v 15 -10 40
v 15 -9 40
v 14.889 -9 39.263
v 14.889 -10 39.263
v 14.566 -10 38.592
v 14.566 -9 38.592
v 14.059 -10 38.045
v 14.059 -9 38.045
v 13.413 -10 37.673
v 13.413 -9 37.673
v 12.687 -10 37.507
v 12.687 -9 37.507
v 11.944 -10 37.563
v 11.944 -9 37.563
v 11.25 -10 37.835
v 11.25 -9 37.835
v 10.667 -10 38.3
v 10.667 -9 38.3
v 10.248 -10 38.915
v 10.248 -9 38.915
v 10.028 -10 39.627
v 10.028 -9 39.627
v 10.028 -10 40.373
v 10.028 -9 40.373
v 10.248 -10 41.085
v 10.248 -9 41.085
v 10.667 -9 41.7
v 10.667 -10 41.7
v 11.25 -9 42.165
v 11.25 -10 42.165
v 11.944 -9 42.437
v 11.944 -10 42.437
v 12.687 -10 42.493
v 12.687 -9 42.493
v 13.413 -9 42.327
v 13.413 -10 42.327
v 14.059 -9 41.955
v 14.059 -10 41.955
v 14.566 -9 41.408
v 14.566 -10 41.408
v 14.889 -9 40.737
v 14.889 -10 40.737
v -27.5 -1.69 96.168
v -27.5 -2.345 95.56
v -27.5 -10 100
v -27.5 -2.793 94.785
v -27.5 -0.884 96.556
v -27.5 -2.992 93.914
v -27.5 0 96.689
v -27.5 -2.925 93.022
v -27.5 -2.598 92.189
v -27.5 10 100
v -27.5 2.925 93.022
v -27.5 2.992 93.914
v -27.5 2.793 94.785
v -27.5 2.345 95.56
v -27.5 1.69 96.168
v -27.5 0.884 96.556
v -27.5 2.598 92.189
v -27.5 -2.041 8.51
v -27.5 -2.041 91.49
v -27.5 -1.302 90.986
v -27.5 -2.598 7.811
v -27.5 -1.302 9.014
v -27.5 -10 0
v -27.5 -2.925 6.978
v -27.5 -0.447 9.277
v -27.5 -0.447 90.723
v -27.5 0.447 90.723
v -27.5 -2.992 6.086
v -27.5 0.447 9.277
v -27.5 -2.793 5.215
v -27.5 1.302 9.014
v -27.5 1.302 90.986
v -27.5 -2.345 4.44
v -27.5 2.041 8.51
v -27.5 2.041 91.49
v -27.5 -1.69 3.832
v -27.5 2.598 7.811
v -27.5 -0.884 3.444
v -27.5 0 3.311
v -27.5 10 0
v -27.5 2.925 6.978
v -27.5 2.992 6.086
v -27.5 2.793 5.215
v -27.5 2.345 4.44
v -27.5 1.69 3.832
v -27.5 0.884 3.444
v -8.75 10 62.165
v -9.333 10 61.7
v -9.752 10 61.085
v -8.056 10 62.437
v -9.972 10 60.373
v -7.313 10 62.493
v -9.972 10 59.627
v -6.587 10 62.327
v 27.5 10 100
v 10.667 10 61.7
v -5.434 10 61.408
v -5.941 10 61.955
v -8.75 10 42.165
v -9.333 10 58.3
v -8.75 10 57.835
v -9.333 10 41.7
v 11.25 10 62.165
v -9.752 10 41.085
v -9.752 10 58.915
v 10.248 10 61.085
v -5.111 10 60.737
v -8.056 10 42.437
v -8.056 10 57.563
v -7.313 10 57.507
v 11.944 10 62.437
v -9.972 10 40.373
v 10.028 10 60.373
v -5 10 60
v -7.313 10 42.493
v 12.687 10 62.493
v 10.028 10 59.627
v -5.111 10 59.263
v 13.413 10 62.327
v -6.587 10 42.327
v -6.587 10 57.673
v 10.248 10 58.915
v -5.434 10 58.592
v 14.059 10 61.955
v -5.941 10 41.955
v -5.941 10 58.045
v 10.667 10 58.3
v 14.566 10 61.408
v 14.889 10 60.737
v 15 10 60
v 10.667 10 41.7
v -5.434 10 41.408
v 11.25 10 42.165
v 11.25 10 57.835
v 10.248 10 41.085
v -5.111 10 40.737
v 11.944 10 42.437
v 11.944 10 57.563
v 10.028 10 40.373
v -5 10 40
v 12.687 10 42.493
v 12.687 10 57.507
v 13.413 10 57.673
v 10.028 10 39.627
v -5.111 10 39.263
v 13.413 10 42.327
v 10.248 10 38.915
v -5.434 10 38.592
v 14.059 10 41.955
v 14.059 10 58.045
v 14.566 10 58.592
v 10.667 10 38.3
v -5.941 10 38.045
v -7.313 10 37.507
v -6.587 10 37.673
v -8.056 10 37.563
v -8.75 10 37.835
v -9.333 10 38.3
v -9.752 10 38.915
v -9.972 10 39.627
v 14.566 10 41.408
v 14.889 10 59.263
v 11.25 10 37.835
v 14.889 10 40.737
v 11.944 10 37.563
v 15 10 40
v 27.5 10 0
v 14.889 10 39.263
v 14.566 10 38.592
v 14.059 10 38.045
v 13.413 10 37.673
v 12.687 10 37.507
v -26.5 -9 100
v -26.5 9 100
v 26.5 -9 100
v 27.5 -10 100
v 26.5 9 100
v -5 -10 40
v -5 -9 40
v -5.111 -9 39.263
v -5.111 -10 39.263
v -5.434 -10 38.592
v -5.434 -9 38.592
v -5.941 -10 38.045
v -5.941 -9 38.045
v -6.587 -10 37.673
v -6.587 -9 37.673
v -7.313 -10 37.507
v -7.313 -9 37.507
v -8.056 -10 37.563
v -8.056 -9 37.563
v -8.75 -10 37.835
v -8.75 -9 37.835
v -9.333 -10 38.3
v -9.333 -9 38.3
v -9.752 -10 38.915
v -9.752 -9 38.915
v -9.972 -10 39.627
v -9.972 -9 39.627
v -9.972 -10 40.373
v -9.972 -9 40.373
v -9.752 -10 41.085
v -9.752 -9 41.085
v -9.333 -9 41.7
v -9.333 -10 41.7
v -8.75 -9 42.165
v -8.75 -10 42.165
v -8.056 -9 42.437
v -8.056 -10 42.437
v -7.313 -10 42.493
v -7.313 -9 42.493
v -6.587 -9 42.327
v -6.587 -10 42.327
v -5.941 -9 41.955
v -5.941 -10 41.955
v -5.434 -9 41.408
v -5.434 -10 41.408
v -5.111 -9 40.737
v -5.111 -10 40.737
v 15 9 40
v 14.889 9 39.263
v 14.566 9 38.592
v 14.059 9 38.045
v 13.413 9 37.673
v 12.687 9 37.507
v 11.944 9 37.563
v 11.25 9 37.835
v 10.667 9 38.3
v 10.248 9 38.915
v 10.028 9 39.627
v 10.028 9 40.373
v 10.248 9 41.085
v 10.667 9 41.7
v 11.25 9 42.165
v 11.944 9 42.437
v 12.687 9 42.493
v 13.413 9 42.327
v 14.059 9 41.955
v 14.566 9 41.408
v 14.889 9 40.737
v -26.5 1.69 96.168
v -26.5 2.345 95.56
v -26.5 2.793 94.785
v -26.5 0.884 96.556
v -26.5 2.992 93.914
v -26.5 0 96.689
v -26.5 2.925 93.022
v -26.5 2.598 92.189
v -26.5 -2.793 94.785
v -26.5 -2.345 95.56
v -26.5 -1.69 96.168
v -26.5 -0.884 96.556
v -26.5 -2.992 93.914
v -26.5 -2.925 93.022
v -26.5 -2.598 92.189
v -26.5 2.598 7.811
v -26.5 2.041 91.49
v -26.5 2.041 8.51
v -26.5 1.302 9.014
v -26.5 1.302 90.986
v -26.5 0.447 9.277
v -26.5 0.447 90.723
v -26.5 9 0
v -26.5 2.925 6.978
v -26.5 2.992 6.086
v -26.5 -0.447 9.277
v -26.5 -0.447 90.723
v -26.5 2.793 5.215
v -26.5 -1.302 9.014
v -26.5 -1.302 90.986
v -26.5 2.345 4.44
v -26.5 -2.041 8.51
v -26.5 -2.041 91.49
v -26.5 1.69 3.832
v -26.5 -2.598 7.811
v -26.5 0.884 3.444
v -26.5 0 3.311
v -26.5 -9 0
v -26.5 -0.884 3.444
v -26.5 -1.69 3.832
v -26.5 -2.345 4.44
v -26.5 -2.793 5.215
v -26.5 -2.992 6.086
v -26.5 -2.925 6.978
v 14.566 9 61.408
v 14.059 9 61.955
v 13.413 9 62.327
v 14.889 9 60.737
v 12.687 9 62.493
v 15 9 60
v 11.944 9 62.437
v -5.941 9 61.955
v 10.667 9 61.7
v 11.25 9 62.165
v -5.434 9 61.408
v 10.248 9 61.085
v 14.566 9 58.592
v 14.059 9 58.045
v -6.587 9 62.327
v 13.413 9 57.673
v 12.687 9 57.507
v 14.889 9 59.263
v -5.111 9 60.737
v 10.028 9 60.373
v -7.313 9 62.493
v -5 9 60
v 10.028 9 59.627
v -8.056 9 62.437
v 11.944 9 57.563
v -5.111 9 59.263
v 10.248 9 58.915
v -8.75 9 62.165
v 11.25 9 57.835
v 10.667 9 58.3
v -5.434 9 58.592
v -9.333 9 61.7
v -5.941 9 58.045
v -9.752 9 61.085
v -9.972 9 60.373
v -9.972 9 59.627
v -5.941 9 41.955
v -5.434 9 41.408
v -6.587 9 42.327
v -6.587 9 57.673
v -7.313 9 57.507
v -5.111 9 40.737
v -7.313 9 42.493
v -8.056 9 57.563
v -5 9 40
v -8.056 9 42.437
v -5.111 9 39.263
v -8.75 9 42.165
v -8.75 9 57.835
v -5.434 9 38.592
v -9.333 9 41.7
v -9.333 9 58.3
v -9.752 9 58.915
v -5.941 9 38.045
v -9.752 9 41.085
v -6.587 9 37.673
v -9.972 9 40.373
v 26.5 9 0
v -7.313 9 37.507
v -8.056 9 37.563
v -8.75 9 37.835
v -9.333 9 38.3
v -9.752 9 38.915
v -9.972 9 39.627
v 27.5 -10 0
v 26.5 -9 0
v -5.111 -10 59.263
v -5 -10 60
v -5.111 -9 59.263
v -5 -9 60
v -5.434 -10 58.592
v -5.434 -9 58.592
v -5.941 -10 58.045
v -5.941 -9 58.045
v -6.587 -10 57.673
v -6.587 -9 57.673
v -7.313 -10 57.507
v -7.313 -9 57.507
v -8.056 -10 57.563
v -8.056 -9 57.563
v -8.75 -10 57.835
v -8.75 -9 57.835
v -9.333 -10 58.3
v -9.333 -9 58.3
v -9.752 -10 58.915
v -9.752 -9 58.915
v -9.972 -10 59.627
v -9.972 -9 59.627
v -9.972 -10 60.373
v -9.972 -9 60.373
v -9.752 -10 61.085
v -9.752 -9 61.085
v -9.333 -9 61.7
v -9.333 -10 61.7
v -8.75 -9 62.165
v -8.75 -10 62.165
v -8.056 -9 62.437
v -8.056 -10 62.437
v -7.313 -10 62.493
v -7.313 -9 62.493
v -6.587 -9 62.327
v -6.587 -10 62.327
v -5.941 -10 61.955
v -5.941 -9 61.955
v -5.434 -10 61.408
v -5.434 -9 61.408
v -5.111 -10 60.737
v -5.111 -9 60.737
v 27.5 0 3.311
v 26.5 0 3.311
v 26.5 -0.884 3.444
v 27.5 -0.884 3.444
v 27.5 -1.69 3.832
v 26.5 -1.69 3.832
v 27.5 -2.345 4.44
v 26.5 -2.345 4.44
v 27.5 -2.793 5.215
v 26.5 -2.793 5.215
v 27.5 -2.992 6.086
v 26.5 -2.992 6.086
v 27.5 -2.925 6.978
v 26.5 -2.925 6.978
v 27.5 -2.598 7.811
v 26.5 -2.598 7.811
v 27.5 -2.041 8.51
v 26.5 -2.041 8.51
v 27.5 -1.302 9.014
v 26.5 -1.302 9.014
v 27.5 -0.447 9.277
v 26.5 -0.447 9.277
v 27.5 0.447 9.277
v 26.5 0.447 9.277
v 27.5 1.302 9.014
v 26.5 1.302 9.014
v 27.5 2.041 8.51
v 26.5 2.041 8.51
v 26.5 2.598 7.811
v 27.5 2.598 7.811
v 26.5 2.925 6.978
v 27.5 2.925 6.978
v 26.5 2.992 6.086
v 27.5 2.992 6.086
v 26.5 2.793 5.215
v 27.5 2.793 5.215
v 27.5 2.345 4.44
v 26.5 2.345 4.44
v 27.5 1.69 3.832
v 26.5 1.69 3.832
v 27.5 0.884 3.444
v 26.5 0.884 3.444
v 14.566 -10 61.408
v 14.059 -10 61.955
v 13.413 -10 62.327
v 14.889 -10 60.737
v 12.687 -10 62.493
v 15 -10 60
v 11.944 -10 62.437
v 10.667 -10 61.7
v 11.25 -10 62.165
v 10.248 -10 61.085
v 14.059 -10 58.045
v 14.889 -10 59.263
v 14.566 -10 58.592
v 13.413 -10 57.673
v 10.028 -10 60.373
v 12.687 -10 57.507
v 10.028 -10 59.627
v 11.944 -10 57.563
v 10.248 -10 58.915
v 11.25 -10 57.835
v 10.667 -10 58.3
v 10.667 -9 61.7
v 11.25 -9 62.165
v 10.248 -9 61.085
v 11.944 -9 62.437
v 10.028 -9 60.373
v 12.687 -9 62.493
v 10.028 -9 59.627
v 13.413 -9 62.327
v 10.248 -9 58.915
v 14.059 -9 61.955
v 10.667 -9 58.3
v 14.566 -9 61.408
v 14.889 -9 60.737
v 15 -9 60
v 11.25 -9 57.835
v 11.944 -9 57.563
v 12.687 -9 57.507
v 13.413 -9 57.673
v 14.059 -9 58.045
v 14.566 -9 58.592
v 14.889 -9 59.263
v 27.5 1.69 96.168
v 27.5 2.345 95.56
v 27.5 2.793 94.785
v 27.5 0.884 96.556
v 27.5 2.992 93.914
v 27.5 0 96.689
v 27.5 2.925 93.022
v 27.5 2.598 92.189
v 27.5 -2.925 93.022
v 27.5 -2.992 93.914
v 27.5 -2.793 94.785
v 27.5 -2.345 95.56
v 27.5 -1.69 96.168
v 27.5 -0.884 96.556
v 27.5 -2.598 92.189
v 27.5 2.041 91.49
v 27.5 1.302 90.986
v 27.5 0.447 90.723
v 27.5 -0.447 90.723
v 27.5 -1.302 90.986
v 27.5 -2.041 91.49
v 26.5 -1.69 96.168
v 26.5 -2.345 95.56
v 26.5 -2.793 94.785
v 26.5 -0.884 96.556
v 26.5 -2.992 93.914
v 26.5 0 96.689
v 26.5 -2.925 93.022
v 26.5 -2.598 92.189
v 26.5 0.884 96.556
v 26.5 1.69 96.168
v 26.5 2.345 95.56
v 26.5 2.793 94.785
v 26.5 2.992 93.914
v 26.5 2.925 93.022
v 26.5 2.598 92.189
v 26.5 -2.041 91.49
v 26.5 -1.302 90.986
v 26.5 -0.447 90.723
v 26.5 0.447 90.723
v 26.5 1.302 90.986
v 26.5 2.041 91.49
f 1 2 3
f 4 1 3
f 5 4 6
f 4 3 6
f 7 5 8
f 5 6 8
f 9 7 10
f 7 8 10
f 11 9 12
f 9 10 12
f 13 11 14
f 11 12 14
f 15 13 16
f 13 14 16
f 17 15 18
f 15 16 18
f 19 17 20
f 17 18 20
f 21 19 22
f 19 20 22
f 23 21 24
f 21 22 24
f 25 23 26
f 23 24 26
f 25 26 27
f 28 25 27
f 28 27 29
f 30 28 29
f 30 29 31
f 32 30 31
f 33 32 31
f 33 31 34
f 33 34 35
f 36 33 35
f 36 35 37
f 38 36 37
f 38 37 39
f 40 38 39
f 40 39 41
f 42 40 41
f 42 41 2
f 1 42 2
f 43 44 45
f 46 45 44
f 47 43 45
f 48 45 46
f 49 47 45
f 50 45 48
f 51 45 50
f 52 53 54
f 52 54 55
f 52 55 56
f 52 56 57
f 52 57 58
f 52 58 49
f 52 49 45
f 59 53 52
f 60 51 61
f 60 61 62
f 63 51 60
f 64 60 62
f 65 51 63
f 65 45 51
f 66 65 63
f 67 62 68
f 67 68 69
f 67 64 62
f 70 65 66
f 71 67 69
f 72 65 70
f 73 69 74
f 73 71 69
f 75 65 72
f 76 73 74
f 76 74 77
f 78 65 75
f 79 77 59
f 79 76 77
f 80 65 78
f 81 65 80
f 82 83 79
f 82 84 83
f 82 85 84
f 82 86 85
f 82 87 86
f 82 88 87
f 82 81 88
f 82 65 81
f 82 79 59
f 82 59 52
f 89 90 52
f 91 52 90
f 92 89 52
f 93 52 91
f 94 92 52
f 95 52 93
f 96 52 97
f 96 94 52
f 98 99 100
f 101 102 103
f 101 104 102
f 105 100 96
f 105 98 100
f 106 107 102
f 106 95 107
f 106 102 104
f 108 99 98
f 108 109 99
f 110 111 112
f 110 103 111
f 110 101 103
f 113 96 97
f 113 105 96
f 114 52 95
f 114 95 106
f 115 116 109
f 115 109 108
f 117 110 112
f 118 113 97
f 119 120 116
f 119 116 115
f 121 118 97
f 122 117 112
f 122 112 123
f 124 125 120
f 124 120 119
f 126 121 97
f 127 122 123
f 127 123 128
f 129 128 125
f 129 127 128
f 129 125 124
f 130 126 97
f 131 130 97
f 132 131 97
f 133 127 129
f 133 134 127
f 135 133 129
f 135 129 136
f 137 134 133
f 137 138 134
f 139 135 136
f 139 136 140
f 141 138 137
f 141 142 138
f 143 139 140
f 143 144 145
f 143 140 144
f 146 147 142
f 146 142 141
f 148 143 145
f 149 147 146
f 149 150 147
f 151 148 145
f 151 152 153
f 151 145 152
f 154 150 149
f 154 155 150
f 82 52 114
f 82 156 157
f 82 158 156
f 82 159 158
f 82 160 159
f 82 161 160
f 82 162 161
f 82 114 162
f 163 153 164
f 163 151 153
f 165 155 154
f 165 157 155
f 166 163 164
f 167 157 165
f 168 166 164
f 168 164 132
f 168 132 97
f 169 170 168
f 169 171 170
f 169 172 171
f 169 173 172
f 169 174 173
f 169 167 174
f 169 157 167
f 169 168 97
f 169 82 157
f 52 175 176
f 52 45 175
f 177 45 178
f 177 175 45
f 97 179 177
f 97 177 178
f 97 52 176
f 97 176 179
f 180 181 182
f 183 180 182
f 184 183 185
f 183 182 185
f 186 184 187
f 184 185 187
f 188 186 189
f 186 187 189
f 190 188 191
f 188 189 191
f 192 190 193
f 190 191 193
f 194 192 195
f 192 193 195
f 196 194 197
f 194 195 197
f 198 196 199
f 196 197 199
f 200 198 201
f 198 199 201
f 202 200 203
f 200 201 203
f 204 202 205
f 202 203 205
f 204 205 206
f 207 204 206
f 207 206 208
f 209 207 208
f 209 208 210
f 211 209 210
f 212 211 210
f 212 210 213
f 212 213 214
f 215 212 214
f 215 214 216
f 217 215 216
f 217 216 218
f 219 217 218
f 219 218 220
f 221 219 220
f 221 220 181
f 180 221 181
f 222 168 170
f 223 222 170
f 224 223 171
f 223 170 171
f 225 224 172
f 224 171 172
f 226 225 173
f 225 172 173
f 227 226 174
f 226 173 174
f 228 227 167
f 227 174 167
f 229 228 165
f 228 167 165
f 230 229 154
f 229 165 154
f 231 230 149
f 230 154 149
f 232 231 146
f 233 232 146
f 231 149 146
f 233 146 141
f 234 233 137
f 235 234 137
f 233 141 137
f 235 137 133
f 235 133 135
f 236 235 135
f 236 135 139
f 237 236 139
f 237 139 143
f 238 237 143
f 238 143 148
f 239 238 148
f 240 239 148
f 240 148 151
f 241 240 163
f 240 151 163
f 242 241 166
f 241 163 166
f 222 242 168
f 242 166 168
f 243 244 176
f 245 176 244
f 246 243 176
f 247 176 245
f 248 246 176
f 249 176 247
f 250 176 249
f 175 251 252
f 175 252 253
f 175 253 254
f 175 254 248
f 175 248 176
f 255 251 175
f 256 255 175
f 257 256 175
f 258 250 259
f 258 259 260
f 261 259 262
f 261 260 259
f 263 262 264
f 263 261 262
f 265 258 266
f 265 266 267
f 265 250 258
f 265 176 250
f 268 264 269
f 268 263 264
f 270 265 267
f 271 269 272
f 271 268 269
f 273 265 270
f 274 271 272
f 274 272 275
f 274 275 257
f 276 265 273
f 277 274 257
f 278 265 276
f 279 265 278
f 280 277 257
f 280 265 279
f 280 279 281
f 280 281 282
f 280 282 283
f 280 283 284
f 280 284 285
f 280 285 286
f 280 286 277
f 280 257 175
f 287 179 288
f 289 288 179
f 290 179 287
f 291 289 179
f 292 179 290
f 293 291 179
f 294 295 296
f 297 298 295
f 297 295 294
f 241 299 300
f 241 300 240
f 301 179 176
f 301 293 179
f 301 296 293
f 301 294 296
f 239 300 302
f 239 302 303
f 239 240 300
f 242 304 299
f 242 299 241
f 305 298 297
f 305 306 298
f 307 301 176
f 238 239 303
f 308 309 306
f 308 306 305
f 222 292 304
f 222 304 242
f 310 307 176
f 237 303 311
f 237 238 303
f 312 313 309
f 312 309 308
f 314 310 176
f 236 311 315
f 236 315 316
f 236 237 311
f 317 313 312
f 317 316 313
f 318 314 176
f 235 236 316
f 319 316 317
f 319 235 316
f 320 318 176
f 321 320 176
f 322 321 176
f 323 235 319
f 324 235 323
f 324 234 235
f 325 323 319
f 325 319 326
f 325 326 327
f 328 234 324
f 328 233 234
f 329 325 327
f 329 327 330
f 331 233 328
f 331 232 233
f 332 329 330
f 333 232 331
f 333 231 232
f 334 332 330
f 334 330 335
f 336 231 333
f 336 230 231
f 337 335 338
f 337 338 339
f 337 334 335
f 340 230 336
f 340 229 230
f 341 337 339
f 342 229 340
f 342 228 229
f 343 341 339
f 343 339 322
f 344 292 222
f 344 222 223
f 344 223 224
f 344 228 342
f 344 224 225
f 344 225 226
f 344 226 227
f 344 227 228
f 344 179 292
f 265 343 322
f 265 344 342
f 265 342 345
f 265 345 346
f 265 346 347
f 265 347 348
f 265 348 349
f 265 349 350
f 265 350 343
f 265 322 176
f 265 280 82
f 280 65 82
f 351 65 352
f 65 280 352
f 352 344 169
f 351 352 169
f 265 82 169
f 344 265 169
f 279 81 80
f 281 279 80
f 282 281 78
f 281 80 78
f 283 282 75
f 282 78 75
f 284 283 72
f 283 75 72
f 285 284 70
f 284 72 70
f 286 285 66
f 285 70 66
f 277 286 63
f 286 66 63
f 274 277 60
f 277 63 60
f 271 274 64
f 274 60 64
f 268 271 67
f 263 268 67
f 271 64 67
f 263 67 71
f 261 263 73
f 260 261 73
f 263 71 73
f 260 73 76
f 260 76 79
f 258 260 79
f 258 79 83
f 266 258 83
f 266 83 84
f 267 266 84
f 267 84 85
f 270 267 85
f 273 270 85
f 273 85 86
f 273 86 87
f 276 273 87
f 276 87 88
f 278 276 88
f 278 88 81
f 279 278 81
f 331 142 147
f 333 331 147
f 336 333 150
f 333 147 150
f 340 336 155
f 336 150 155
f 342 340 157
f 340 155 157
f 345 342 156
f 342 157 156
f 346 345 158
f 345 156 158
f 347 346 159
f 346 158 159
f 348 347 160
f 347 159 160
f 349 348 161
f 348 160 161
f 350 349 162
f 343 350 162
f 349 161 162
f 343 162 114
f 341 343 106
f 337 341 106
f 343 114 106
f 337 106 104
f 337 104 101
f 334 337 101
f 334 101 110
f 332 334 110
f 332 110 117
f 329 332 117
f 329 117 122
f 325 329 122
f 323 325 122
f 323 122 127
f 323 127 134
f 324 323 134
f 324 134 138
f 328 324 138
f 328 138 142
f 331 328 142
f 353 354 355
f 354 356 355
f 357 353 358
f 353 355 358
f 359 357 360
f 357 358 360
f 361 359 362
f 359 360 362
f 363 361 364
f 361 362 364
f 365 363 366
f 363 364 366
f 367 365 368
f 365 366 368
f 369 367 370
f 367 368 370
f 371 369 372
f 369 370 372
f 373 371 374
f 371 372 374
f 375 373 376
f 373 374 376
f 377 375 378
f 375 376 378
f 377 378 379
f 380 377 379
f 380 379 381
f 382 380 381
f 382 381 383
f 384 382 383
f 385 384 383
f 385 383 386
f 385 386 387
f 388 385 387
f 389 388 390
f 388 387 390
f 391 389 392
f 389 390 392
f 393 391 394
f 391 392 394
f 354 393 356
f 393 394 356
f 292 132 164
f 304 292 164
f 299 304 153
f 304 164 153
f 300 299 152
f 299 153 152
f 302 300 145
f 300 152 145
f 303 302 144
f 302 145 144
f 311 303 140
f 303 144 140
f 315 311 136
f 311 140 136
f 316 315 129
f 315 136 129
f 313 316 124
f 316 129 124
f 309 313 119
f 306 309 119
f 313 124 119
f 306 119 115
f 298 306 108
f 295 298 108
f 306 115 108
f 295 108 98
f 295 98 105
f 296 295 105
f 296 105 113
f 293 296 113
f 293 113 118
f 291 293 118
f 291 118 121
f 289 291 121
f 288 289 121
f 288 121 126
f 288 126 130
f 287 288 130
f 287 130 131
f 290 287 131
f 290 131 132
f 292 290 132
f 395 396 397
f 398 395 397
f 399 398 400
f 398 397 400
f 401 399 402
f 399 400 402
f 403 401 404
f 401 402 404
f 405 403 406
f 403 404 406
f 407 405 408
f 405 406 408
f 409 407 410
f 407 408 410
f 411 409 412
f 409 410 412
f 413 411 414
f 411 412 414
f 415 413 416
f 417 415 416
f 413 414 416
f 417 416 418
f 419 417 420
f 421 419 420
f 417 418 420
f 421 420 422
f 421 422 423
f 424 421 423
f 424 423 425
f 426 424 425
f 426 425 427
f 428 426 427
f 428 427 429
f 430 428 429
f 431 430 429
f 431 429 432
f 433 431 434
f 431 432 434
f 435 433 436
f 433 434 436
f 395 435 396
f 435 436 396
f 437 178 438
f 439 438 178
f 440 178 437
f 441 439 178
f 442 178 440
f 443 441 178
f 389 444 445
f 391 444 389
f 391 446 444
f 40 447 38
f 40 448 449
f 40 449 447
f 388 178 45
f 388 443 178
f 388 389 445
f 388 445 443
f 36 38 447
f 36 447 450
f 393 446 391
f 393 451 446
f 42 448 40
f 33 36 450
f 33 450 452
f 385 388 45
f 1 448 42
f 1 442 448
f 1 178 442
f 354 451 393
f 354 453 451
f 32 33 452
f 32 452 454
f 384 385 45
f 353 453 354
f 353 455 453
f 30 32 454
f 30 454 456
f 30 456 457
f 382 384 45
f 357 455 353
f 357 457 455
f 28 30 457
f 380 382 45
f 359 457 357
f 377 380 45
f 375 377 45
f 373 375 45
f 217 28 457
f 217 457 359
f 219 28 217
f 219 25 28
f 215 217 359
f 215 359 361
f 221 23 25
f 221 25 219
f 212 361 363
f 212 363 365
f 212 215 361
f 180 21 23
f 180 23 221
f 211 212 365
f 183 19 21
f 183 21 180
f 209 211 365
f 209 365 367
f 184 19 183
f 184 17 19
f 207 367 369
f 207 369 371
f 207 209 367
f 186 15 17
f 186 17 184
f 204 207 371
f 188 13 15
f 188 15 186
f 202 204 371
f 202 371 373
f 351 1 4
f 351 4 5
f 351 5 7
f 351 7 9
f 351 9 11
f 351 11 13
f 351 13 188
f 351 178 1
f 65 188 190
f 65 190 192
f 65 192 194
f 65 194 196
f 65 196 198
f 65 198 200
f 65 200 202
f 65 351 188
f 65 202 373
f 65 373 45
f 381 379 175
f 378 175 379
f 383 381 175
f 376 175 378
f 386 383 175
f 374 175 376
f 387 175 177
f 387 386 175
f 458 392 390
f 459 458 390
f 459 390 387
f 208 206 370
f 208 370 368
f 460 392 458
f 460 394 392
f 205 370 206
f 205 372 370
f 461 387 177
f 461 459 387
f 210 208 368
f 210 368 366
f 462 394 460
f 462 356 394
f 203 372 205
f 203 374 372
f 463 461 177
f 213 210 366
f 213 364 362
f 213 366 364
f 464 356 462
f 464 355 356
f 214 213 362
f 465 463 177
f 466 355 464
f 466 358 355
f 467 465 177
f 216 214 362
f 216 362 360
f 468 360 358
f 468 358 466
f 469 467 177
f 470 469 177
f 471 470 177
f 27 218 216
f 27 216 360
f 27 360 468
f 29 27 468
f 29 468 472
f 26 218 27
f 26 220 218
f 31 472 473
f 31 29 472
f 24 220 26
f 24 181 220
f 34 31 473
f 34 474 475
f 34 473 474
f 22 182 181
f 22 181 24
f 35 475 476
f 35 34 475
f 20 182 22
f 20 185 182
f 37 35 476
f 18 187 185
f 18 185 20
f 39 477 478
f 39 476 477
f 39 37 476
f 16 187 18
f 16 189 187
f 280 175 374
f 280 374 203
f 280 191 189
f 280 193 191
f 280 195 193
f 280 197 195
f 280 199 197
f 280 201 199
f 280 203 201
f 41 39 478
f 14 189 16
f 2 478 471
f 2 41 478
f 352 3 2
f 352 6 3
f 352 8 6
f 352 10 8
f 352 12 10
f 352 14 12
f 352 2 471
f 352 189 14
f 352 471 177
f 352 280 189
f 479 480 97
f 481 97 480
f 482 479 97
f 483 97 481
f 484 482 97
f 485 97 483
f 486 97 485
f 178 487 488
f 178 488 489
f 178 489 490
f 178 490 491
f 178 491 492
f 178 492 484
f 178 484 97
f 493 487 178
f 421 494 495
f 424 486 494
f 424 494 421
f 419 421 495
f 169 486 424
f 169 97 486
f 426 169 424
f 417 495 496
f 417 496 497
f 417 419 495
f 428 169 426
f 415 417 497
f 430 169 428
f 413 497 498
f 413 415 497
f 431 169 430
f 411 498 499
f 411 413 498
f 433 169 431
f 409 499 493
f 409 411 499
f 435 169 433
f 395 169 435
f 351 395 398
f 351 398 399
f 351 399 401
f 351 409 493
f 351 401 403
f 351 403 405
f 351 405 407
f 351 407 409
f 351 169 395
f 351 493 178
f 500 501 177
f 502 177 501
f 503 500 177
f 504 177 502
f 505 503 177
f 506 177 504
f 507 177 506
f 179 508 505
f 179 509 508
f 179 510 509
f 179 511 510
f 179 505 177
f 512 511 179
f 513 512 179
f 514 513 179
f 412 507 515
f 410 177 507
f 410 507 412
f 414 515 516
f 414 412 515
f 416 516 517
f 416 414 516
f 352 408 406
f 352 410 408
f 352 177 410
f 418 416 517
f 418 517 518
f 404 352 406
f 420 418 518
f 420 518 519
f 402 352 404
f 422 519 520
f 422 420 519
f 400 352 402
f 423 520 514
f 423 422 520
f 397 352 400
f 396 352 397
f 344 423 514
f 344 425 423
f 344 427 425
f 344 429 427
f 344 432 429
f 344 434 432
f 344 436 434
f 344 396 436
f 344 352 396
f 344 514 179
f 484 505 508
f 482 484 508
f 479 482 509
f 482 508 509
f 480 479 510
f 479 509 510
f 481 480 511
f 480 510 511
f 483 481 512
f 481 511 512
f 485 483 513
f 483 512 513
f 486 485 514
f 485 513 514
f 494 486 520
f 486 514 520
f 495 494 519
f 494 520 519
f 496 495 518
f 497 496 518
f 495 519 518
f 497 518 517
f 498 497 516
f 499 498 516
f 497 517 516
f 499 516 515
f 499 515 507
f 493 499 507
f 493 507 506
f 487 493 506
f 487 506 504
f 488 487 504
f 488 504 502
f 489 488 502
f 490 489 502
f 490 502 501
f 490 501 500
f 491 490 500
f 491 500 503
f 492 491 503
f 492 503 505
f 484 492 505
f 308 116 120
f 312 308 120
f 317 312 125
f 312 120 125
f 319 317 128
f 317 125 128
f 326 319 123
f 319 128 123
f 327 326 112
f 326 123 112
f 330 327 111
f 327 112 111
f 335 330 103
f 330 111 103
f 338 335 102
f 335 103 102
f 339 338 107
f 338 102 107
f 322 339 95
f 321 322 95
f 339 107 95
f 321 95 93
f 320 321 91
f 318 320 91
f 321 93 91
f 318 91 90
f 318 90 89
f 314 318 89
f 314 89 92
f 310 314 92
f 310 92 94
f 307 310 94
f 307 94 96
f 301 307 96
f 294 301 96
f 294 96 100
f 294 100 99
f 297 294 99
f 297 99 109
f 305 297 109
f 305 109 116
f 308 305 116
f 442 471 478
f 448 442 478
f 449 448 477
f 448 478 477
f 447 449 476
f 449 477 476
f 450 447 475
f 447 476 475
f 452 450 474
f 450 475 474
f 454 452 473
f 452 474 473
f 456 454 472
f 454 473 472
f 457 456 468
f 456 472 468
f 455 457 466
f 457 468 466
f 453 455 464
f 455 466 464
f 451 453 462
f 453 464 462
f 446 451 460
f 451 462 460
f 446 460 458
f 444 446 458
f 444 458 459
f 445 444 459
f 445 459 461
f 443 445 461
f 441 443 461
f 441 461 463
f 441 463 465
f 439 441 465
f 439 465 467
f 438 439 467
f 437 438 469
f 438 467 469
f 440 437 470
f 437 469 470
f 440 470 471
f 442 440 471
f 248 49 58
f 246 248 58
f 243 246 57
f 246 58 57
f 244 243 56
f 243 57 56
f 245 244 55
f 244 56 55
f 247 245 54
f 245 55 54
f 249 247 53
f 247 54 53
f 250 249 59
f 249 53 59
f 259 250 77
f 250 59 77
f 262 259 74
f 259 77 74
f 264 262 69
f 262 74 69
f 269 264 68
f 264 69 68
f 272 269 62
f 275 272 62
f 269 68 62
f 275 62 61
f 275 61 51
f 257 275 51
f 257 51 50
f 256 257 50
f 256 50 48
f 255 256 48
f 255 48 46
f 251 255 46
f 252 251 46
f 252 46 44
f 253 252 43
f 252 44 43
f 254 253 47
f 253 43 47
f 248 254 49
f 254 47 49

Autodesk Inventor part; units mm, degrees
ref_plane "YZ Plane" through (0, 0, 0) normal (1, 0, 0) x (0, 1, 0)
ref_plane "XZ Plane" through (0, 0, 0) normal (0, 1, 0) x (-1, 0, 0)
sketch "草图1" plane through (0, 0, 0) normal (0, 0, 1) x (1, 0, 0)
  line L0 (27.5, -10) -> (-27.5, -10)
  line L1 (-27.5, -10) -> (-27.5, 10)
  line L2 (-27.5, 10) -> (27.5, 10)
  line L3 (27.5, 10) -> (27.5, -10)
  line L4 (27.5, -10) -> (-27.5, 10) construction
  line L5 (-27.5, -10) -> (27.5, 10) construction
  point P0 (0, 0)
  dimension "d0" = 55
  dimension "d1" = 20
extrude "拉伸1" add sketch "草图1" along normal blind 100
sketch "草图2" plane through (0, 0, 0) normal (0, 0, -1) x (-1, 0, 0)
  line L0 (-27.5, 10) -> (27.5, 10) projected
  line L1 (-27.5, -10) -> (-27.5, 10) projected
  line L2 (27.5, -10) -> (-27.5, -10) projected
  line L3 (27.5, 10) -> (27.5, -10) projected
  line L4 (26.5, -9) -> (-26.5, -9)
  line L5 (-26.5, -9) -> (-26.5, 9)
  line L6 (-26.5, 9) -> (26.5, 9)
  line L7 (26.5, 9) -> (26.5, -9)
  point P0 (0, 0)
  dimension "d4" = 1
extrude "拉伸2" cut sketch "草图2" against normal blind 109.25 contours L4 L5 L6 L7
sketch "草图3" plane through (-27.5, -10, 0) normal (-1, 0, 0) x (0, 0, 1)
  line L0 (100, 19) -> (100, 1) projected
  line L1 (100, 10) -> (53.3489, 10)
  circle A0 centre (93.6894, 10) radius 3
  point P0 (0, 10)
  dimension "d7" = 6
extrude "拉伸3" cut sketch "草图3" against normal blind 109.25
ref_plane "工作平面1" through (0, 0, 50) normal (0, 0, -1) x (-1, 0, 0)
mirror "镜像1" about plane through (0, 0, 50) normal (0, 0, -1) of "拉伸3"
sketch "草图4" plane through (-27.5, 10, 0) normal (0, 1, 0) x (1, 0, 0)
  line L0 (54, 0) -> (54, -100) projected
  line L1 (55, 0) -> (55, -100) projected
  circle A0 centre (232, -40) radius 2.5 projected
  circle A1 centre (40, -60) radius 2.5 projected
  circle A2 centre (212, -40) radius 2.5 projected
  circle A3 centre (212, -60) radius 2.5 projected
  circle A4 centre (20, -40) radius 2.5 projected
  circle A5 centre (20, -60) radius 2.5 projected
  circle A6 centre (232, -60) radius 2.5 projected
  circle A7 centre (40, -40) radius 2.5 projected
  line L2 (61, -70) -> (61, -150) projected
  line L3 (61, -150) -> (191, -150) projected
  line L4 (191, -150) -> (191, -70) projected
  line L5 (191, -70) -> (246, -70) projected
  line L6 (246, -70) -> (246, -30) projected
  line L7 (246, -30) -> (191, -30) projected
  line L8 (191, -30) -> (191, 50) projected
  line L9 (191, 50) -> (61, 50) projected
  line L10 (61, 50) -> (61, -30) projected
  line L11 (61, -30) -> (6, -30) projected
  line L12 (6, -30) -> (6, -70) projected
  line L13 (6, -70) -> (61, -70) projected
  point P0 (27.5, 0)
extrude "拉伸4" cut sketch "草图4" against normal blind 42.75 contours A1 | A4 | A5 | A7
properties part number "铝方管"
